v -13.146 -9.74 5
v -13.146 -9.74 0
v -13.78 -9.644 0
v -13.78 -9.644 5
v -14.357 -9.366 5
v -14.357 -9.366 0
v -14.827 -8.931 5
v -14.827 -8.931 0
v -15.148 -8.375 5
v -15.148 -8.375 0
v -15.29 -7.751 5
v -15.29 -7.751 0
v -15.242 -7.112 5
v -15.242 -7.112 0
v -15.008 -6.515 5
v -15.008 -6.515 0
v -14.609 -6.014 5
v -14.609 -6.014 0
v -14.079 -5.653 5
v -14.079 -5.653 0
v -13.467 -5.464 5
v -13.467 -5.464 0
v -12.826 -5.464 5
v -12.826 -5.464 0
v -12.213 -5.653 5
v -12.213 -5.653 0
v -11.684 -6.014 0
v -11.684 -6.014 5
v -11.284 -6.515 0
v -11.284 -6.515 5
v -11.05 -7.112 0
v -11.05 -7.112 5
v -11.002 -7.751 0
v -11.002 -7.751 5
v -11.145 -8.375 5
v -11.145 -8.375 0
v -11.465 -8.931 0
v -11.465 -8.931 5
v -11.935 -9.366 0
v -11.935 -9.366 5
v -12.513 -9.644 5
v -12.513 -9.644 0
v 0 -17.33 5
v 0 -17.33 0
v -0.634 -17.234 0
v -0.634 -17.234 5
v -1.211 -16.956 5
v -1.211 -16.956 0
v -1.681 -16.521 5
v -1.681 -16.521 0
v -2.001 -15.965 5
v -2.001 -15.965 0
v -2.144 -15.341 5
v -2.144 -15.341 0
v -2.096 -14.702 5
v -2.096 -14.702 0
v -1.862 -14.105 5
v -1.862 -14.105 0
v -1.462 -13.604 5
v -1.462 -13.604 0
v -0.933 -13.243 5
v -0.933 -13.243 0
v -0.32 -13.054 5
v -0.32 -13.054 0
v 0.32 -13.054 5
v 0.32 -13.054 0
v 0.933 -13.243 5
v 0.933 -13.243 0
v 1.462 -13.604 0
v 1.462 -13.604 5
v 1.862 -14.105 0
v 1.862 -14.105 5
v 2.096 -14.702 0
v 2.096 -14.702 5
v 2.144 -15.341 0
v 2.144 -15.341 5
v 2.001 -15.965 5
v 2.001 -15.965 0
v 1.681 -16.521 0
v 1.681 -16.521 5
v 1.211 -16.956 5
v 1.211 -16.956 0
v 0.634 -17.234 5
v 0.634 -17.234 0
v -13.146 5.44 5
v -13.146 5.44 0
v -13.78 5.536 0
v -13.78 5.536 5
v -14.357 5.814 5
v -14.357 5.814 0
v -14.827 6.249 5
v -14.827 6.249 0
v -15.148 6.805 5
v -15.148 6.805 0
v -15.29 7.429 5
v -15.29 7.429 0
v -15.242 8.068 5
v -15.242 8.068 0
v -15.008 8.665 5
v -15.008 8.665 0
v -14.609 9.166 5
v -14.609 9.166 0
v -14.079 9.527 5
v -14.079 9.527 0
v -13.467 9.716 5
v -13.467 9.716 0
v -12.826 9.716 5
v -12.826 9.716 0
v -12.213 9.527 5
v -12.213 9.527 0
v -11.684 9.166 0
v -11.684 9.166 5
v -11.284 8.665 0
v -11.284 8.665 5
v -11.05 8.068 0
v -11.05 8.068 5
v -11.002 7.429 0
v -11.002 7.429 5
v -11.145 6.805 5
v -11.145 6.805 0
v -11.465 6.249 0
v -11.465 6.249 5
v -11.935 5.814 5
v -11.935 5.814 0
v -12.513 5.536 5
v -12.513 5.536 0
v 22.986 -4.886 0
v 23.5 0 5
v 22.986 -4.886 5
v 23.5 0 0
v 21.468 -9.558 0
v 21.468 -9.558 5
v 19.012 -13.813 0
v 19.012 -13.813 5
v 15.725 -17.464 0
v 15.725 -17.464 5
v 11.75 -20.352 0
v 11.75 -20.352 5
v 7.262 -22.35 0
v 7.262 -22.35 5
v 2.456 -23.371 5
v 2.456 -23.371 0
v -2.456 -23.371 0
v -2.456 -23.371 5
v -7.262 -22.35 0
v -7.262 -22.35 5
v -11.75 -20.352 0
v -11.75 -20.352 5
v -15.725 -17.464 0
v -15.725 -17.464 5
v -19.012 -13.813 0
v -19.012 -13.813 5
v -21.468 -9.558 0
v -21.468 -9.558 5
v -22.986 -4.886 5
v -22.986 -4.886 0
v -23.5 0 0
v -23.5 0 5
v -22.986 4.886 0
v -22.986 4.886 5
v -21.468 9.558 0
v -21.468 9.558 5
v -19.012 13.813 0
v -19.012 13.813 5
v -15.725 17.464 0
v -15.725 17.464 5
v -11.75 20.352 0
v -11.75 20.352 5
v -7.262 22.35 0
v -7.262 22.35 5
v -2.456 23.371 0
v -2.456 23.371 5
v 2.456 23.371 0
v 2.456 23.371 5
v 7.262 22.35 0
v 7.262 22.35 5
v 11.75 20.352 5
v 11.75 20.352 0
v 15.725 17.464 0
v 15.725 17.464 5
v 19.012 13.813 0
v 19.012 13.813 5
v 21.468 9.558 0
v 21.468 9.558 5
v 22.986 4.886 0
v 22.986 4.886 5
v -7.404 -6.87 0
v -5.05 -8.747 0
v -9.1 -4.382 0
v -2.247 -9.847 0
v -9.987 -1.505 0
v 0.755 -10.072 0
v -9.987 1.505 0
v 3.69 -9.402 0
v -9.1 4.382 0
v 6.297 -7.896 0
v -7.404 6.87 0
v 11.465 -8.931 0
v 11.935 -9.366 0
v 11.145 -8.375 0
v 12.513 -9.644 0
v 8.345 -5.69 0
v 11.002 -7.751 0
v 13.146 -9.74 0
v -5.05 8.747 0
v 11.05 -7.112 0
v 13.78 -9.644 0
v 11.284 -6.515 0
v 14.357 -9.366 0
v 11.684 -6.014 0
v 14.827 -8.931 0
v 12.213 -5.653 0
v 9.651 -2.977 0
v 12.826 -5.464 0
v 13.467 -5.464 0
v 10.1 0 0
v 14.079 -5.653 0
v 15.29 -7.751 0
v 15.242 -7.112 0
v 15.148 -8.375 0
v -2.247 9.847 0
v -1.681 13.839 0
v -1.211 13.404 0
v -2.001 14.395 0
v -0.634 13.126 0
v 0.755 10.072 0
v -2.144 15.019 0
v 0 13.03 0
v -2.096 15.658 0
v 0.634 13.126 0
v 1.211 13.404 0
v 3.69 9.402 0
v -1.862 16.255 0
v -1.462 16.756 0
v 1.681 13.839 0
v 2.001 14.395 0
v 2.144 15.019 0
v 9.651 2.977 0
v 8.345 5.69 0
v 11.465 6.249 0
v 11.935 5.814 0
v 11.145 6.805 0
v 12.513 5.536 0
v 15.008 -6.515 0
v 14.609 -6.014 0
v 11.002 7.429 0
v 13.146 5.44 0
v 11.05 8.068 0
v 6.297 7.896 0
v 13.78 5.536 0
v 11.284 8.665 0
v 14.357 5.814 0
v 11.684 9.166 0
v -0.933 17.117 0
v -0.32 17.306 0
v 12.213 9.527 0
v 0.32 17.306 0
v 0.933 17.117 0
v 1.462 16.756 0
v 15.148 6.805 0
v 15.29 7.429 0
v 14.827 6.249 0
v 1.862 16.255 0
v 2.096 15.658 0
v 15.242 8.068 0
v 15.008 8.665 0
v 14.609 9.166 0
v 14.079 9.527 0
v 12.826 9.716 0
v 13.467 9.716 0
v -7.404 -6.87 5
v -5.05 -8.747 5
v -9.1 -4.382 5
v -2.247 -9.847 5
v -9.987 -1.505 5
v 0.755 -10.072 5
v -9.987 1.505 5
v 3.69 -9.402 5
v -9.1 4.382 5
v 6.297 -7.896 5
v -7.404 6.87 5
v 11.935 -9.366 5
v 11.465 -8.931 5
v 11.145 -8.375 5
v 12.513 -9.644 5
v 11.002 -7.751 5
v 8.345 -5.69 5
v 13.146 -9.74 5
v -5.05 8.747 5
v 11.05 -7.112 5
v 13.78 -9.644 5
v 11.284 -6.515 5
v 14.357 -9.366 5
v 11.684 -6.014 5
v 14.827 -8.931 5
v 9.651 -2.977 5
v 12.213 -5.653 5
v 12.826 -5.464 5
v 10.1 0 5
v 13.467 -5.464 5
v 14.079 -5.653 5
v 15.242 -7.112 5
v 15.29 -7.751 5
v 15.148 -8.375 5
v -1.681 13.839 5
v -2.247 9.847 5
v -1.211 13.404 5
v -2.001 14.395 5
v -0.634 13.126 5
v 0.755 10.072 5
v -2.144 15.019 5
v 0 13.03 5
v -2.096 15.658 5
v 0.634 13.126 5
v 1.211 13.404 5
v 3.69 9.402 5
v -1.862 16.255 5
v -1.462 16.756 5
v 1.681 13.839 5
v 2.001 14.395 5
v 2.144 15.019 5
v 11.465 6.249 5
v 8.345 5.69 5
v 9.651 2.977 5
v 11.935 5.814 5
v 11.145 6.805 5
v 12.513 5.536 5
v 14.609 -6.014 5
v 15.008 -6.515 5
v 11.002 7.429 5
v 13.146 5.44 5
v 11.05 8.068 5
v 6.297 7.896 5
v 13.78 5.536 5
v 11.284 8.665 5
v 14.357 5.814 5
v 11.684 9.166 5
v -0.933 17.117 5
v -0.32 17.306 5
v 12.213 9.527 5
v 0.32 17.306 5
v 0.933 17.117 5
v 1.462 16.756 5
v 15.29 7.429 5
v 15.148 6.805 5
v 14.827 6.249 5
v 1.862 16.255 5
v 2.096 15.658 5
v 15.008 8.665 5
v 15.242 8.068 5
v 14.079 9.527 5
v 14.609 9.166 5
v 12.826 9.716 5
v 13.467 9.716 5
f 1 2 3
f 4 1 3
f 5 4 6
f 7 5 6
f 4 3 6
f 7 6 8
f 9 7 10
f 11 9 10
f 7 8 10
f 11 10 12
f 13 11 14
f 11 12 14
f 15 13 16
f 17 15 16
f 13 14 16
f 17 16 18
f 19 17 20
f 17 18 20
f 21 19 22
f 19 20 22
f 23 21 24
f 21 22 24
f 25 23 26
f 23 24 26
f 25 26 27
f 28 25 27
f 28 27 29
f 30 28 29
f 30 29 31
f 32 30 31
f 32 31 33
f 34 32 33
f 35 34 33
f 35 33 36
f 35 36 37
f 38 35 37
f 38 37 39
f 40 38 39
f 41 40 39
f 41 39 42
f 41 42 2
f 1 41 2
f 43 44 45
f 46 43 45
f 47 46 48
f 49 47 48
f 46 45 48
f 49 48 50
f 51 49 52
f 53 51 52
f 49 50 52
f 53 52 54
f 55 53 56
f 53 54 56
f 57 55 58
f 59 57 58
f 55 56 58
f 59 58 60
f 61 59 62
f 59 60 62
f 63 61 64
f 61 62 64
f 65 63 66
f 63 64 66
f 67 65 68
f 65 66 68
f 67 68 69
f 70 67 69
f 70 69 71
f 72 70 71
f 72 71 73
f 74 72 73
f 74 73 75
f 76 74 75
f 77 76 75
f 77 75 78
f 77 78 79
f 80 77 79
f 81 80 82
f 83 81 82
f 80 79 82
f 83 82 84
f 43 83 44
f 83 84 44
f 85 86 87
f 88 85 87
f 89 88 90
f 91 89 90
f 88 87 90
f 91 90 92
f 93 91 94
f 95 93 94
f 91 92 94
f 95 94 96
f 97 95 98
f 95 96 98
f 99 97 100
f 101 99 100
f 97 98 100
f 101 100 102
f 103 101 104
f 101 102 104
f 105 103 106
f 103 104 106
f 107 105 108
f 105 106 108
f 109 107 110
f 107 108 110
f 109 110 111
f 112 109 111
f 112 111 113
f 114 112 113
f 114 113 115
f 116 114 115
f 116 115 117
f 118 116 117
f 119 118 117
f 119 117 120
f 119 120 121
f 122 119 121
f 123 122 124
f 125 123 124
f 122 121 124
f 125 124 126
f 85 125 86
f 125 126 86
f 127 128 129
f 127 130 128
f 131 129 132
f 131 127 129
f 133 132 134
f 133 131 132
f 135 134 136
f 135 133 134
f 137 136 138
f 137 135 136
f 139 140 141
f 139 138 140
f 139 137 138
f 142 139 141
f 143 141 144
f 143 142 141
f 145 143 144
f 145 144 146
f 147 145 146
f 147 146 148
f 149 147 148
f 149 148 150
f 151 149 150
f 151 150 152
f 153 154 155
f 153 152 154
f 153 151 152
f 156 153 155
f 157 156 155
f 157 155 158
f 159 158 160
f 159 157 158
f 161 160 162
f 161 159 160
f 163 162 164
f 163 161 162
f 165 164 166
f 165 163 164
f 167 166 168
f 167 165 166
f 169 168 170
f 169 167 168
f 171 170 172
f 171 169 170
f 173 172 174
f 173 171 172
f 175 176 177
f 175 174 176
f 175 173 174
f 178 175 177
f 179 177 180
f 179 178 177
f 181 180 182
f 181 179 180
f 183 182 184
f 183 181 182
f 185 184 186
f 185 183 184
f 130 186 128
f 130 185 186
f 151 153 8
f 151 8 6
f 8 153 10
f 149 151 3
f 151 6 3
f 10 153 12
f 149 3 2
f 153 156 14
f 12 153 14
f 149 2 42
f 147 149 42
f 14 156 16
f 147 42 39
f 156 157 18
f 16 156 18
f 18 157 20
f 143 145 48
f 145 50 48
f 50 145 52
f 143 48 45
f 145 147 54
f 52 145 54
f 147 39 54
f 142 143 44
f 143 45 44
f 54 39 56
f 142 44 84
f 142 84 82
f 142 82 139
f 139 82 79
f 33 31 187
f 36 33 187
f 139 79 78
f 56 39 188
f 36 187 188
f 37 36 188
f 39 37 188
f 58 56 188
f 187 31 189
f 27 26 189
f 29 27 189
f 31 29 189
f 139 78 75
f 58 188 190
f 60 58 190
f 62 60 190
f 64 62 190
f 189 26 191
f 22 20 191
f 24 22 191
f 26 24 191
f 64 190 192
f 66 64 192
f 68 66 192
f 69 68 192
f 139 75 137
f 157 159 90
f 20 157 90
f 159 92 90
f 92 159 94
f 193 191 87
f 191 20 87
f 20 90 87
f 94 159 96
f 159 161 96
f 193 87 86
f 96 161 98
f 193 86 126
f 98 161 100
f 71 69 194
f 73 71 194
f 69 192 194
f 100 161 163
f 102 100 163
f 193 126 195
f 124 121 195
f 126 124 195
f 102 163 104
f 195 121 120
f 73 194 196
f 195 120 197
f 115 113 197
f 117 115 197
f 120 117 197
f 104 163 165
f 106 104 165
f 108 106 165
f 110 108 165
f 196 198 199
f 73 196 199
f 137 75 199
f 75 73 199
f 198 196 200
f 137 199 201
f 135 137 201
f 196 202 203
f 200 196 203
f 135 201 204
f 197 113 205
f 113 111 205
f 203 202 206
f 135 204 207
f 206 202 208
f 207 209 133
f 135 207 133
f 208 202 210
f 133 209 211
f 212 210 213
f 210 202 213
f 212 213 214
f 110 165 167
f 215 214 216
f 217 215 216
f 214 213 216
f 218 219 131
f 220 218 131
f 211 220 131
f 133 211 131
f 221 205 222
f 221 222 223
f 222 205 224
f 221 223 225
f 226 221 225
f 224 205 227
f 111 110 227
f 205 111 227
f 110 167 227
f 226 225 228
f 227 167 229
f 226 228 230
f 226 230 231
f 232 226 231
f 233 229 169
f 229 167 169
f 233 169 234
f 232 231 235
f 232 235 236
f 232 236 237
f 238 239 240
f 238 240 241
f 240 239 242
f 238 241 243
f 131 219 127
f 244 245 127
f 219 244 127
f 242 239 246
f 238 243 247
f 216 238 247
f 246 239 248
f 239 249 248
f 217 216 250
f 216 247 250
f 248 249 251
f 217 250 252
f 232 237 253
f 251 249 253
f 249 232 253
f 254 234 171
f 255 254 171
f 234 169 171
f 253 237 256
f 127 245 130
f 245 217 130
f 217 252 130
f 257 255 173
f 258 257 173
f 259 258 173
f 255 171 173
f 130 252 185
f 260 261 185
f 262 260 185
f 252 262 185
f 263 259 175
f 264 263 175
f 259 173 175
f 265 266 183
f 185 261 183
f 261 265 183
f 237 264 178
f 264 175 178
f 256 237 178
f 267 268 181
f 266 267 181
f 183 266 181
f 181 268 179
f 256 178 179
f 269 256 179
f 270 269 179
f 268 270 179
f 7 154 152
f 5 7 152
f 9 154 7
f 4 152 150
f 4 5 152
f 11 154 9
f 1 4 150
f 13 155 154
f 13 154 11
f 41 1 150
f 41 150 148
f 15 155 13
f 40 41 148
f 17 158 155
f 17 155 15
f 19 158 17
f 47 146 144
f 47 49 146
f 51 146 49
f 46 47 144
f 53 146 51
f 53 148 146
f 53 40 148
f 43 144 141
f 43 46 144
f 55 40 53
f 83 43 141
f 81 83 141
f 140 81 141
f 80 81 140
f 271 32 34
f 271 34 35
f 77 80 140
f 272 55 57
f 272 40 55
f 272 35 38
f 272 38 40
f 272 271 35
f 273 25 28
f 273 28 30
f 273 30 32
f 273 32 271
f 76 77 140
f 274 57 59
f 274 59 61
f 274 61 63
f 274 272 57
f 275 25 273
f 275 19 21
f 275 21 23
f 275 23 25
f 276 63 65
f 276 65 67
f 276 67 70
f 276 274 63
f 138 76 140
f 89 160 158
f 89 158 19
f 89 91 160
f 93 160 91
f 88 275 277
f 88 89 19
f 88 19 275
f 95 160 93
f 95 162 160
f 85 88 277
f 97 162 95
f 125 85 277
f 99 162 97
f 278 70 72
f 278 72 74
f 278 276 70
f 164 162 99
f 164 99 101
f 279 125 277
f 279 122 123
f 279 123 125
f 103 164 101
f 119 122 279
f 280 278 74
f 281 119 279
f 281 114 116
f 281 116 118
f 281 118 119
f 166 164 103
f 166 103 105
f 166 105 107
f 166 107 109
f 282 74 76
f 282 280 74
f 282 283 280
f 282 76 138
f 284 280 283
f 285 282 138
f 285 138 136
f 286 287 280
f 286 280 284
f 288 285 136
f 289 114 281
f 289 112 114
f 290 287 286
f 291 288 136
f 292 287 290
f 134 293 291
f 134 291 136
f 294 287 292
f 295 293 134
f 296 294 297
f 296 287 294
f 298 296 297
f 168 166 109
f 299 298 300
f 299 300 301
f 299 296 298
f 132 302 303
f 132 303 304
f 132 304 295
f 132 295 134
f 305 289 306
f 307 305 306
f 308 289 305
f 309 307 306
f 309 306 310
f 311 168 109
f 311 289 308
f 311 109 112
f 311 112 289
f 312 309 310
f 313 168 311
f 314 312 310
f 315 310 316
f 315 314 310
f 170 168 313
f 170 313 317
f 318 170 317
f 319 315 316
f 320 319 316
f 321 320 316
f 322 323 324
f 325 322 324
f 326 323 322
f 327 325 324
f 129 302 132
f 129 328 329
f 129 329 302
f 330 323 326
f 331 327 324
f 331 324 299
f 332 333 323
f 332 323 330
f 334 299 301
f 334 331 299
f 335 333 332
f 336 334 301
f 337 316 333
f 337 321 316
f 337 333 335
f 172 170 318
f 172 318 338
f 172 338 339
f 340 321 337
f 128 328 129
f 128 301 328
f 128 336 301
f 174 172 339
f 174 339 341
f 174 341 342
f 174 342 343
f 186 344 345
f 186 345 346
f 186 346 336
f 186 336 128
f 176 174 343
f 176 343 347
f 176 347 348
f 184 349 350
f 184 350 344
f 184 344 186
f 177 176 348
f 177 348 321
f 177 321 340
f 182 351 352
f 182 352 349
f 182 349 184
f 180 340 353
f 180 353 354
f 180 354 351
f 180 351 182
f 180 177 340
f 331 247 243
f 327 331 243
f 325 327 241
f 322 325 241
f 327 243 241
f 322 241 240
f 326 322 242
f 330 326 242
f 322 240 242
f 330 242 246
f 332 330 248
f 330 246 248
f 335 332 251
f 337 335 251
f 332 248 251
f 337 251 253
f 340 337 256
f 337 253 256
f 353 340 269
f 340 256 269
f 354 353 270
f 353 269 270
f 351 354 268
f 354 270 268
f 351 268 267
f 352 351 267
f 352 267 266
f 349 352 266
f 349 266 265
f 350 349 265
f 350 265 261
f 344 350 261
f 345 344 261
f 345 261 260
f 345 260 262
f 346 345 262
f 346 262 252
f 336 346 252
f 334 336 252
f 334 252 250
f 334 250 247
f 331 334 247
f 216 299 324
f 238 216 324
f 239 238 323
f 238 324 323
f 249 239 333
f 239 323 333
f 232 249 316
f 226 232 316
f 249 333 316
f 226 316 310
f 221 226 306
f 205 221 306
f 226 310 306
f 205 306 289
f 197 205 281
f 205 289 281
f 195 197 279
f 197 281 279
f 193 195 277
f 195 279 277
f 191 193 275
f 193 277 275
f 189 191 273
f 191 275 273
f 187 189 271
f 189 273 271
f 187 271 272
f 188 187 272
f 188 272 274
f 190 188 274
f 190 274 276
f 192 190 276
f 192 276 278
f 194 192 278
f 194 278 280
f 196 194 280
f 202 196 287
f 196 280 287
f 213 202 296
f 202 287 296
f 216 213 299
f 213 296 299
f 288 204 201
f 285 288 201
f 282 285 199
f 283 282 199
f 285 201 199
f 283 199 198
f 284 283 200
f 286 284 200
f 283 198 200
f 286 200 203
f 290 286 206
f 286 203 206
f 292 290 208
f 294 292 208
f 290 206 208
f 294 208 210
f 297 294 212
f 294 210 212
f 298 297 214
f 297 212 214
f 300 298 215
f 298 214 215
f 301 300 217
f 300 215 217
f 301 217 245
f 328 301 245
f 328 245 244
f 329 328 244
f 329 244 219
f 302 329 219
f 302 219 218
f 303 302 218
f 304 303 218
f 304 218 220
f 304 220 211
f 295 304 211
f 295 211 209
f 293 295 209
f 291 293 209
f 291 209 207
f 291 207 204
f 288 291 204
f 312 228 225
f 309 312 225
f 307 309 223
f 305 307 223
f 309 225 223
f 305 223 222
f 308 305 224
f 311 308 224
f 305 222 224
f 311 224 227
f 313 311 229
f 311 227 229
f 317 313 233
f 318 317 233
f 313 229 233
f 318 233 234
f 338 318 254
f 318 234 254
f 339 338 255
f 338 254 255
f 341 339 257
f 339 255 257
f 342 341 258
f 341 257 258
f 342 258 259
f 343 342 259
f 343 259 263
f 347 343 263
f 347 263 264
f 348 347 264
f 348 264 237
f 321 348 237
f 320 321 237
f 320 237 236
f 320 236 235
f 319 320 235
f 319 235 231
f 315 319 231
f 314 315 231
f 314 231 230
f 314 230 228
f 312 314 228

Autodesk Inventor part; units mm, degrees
ref_plane "YZ Plane" through (0, 0, 0) normal (1, 0, 0) x (0, 1, 0)
ref_plane "XZ Plane" through (0, 0, 0) normal (0, 1, 0) x (-1, 0, 0)
ref_plane "XY Plane" through (0, 0, 0) normal (0, 0, 1) x (1, 0, 0)
sketch "スケッチ1" plane through (0, 0, 0) normal (0, 0, 1) x (1, 0, 0)
  circle A0 centre (0, 0) radius 23.5
  dimension "d0" = 47
extrude "押し出し1" add sketch "スケッチ1" along normal blind 5
sketch "スケッチ2" plane through (0, 0, 5) normal (0, 0, 1) x (1, 0, 0)
  circle A0 centre (0, 0) radius 15.18
  point P0 (0, 15.18)
  point P1 (-13.1463, 7.59)
  point P2 (-13.1463, -7.59)
  point P3 (0, -15.18)
  point P4 (13.1463, -7.59)
  point P5 (13.1463, 7.59)
  dimension "d3" = 30.36
  dimension "d6" = 360
hole "穴1" at (0, 15.18, 5) at (-13.1463, 7.59, 5) at (-13.1463, -7.59, 5) at (0, -15.18, 5) at (13.1463, -7.59, 5) at (13.1463, 7.59, 5) direction (0, 0, -1) diameter 4.3 end through all
sketch "スケッチ3" plane through (0, 0, 5) normal (0, 0, 1) x (1, 0, 0)
  circle A0 centre (0, 0) radius 10.1
  dimension "d15" = 20.2
extrude "押し出し2" cut sketch "スケッチ3" against normal blind 5
properties part number "servoplate_forR3" material "アルミニウム 6061"
